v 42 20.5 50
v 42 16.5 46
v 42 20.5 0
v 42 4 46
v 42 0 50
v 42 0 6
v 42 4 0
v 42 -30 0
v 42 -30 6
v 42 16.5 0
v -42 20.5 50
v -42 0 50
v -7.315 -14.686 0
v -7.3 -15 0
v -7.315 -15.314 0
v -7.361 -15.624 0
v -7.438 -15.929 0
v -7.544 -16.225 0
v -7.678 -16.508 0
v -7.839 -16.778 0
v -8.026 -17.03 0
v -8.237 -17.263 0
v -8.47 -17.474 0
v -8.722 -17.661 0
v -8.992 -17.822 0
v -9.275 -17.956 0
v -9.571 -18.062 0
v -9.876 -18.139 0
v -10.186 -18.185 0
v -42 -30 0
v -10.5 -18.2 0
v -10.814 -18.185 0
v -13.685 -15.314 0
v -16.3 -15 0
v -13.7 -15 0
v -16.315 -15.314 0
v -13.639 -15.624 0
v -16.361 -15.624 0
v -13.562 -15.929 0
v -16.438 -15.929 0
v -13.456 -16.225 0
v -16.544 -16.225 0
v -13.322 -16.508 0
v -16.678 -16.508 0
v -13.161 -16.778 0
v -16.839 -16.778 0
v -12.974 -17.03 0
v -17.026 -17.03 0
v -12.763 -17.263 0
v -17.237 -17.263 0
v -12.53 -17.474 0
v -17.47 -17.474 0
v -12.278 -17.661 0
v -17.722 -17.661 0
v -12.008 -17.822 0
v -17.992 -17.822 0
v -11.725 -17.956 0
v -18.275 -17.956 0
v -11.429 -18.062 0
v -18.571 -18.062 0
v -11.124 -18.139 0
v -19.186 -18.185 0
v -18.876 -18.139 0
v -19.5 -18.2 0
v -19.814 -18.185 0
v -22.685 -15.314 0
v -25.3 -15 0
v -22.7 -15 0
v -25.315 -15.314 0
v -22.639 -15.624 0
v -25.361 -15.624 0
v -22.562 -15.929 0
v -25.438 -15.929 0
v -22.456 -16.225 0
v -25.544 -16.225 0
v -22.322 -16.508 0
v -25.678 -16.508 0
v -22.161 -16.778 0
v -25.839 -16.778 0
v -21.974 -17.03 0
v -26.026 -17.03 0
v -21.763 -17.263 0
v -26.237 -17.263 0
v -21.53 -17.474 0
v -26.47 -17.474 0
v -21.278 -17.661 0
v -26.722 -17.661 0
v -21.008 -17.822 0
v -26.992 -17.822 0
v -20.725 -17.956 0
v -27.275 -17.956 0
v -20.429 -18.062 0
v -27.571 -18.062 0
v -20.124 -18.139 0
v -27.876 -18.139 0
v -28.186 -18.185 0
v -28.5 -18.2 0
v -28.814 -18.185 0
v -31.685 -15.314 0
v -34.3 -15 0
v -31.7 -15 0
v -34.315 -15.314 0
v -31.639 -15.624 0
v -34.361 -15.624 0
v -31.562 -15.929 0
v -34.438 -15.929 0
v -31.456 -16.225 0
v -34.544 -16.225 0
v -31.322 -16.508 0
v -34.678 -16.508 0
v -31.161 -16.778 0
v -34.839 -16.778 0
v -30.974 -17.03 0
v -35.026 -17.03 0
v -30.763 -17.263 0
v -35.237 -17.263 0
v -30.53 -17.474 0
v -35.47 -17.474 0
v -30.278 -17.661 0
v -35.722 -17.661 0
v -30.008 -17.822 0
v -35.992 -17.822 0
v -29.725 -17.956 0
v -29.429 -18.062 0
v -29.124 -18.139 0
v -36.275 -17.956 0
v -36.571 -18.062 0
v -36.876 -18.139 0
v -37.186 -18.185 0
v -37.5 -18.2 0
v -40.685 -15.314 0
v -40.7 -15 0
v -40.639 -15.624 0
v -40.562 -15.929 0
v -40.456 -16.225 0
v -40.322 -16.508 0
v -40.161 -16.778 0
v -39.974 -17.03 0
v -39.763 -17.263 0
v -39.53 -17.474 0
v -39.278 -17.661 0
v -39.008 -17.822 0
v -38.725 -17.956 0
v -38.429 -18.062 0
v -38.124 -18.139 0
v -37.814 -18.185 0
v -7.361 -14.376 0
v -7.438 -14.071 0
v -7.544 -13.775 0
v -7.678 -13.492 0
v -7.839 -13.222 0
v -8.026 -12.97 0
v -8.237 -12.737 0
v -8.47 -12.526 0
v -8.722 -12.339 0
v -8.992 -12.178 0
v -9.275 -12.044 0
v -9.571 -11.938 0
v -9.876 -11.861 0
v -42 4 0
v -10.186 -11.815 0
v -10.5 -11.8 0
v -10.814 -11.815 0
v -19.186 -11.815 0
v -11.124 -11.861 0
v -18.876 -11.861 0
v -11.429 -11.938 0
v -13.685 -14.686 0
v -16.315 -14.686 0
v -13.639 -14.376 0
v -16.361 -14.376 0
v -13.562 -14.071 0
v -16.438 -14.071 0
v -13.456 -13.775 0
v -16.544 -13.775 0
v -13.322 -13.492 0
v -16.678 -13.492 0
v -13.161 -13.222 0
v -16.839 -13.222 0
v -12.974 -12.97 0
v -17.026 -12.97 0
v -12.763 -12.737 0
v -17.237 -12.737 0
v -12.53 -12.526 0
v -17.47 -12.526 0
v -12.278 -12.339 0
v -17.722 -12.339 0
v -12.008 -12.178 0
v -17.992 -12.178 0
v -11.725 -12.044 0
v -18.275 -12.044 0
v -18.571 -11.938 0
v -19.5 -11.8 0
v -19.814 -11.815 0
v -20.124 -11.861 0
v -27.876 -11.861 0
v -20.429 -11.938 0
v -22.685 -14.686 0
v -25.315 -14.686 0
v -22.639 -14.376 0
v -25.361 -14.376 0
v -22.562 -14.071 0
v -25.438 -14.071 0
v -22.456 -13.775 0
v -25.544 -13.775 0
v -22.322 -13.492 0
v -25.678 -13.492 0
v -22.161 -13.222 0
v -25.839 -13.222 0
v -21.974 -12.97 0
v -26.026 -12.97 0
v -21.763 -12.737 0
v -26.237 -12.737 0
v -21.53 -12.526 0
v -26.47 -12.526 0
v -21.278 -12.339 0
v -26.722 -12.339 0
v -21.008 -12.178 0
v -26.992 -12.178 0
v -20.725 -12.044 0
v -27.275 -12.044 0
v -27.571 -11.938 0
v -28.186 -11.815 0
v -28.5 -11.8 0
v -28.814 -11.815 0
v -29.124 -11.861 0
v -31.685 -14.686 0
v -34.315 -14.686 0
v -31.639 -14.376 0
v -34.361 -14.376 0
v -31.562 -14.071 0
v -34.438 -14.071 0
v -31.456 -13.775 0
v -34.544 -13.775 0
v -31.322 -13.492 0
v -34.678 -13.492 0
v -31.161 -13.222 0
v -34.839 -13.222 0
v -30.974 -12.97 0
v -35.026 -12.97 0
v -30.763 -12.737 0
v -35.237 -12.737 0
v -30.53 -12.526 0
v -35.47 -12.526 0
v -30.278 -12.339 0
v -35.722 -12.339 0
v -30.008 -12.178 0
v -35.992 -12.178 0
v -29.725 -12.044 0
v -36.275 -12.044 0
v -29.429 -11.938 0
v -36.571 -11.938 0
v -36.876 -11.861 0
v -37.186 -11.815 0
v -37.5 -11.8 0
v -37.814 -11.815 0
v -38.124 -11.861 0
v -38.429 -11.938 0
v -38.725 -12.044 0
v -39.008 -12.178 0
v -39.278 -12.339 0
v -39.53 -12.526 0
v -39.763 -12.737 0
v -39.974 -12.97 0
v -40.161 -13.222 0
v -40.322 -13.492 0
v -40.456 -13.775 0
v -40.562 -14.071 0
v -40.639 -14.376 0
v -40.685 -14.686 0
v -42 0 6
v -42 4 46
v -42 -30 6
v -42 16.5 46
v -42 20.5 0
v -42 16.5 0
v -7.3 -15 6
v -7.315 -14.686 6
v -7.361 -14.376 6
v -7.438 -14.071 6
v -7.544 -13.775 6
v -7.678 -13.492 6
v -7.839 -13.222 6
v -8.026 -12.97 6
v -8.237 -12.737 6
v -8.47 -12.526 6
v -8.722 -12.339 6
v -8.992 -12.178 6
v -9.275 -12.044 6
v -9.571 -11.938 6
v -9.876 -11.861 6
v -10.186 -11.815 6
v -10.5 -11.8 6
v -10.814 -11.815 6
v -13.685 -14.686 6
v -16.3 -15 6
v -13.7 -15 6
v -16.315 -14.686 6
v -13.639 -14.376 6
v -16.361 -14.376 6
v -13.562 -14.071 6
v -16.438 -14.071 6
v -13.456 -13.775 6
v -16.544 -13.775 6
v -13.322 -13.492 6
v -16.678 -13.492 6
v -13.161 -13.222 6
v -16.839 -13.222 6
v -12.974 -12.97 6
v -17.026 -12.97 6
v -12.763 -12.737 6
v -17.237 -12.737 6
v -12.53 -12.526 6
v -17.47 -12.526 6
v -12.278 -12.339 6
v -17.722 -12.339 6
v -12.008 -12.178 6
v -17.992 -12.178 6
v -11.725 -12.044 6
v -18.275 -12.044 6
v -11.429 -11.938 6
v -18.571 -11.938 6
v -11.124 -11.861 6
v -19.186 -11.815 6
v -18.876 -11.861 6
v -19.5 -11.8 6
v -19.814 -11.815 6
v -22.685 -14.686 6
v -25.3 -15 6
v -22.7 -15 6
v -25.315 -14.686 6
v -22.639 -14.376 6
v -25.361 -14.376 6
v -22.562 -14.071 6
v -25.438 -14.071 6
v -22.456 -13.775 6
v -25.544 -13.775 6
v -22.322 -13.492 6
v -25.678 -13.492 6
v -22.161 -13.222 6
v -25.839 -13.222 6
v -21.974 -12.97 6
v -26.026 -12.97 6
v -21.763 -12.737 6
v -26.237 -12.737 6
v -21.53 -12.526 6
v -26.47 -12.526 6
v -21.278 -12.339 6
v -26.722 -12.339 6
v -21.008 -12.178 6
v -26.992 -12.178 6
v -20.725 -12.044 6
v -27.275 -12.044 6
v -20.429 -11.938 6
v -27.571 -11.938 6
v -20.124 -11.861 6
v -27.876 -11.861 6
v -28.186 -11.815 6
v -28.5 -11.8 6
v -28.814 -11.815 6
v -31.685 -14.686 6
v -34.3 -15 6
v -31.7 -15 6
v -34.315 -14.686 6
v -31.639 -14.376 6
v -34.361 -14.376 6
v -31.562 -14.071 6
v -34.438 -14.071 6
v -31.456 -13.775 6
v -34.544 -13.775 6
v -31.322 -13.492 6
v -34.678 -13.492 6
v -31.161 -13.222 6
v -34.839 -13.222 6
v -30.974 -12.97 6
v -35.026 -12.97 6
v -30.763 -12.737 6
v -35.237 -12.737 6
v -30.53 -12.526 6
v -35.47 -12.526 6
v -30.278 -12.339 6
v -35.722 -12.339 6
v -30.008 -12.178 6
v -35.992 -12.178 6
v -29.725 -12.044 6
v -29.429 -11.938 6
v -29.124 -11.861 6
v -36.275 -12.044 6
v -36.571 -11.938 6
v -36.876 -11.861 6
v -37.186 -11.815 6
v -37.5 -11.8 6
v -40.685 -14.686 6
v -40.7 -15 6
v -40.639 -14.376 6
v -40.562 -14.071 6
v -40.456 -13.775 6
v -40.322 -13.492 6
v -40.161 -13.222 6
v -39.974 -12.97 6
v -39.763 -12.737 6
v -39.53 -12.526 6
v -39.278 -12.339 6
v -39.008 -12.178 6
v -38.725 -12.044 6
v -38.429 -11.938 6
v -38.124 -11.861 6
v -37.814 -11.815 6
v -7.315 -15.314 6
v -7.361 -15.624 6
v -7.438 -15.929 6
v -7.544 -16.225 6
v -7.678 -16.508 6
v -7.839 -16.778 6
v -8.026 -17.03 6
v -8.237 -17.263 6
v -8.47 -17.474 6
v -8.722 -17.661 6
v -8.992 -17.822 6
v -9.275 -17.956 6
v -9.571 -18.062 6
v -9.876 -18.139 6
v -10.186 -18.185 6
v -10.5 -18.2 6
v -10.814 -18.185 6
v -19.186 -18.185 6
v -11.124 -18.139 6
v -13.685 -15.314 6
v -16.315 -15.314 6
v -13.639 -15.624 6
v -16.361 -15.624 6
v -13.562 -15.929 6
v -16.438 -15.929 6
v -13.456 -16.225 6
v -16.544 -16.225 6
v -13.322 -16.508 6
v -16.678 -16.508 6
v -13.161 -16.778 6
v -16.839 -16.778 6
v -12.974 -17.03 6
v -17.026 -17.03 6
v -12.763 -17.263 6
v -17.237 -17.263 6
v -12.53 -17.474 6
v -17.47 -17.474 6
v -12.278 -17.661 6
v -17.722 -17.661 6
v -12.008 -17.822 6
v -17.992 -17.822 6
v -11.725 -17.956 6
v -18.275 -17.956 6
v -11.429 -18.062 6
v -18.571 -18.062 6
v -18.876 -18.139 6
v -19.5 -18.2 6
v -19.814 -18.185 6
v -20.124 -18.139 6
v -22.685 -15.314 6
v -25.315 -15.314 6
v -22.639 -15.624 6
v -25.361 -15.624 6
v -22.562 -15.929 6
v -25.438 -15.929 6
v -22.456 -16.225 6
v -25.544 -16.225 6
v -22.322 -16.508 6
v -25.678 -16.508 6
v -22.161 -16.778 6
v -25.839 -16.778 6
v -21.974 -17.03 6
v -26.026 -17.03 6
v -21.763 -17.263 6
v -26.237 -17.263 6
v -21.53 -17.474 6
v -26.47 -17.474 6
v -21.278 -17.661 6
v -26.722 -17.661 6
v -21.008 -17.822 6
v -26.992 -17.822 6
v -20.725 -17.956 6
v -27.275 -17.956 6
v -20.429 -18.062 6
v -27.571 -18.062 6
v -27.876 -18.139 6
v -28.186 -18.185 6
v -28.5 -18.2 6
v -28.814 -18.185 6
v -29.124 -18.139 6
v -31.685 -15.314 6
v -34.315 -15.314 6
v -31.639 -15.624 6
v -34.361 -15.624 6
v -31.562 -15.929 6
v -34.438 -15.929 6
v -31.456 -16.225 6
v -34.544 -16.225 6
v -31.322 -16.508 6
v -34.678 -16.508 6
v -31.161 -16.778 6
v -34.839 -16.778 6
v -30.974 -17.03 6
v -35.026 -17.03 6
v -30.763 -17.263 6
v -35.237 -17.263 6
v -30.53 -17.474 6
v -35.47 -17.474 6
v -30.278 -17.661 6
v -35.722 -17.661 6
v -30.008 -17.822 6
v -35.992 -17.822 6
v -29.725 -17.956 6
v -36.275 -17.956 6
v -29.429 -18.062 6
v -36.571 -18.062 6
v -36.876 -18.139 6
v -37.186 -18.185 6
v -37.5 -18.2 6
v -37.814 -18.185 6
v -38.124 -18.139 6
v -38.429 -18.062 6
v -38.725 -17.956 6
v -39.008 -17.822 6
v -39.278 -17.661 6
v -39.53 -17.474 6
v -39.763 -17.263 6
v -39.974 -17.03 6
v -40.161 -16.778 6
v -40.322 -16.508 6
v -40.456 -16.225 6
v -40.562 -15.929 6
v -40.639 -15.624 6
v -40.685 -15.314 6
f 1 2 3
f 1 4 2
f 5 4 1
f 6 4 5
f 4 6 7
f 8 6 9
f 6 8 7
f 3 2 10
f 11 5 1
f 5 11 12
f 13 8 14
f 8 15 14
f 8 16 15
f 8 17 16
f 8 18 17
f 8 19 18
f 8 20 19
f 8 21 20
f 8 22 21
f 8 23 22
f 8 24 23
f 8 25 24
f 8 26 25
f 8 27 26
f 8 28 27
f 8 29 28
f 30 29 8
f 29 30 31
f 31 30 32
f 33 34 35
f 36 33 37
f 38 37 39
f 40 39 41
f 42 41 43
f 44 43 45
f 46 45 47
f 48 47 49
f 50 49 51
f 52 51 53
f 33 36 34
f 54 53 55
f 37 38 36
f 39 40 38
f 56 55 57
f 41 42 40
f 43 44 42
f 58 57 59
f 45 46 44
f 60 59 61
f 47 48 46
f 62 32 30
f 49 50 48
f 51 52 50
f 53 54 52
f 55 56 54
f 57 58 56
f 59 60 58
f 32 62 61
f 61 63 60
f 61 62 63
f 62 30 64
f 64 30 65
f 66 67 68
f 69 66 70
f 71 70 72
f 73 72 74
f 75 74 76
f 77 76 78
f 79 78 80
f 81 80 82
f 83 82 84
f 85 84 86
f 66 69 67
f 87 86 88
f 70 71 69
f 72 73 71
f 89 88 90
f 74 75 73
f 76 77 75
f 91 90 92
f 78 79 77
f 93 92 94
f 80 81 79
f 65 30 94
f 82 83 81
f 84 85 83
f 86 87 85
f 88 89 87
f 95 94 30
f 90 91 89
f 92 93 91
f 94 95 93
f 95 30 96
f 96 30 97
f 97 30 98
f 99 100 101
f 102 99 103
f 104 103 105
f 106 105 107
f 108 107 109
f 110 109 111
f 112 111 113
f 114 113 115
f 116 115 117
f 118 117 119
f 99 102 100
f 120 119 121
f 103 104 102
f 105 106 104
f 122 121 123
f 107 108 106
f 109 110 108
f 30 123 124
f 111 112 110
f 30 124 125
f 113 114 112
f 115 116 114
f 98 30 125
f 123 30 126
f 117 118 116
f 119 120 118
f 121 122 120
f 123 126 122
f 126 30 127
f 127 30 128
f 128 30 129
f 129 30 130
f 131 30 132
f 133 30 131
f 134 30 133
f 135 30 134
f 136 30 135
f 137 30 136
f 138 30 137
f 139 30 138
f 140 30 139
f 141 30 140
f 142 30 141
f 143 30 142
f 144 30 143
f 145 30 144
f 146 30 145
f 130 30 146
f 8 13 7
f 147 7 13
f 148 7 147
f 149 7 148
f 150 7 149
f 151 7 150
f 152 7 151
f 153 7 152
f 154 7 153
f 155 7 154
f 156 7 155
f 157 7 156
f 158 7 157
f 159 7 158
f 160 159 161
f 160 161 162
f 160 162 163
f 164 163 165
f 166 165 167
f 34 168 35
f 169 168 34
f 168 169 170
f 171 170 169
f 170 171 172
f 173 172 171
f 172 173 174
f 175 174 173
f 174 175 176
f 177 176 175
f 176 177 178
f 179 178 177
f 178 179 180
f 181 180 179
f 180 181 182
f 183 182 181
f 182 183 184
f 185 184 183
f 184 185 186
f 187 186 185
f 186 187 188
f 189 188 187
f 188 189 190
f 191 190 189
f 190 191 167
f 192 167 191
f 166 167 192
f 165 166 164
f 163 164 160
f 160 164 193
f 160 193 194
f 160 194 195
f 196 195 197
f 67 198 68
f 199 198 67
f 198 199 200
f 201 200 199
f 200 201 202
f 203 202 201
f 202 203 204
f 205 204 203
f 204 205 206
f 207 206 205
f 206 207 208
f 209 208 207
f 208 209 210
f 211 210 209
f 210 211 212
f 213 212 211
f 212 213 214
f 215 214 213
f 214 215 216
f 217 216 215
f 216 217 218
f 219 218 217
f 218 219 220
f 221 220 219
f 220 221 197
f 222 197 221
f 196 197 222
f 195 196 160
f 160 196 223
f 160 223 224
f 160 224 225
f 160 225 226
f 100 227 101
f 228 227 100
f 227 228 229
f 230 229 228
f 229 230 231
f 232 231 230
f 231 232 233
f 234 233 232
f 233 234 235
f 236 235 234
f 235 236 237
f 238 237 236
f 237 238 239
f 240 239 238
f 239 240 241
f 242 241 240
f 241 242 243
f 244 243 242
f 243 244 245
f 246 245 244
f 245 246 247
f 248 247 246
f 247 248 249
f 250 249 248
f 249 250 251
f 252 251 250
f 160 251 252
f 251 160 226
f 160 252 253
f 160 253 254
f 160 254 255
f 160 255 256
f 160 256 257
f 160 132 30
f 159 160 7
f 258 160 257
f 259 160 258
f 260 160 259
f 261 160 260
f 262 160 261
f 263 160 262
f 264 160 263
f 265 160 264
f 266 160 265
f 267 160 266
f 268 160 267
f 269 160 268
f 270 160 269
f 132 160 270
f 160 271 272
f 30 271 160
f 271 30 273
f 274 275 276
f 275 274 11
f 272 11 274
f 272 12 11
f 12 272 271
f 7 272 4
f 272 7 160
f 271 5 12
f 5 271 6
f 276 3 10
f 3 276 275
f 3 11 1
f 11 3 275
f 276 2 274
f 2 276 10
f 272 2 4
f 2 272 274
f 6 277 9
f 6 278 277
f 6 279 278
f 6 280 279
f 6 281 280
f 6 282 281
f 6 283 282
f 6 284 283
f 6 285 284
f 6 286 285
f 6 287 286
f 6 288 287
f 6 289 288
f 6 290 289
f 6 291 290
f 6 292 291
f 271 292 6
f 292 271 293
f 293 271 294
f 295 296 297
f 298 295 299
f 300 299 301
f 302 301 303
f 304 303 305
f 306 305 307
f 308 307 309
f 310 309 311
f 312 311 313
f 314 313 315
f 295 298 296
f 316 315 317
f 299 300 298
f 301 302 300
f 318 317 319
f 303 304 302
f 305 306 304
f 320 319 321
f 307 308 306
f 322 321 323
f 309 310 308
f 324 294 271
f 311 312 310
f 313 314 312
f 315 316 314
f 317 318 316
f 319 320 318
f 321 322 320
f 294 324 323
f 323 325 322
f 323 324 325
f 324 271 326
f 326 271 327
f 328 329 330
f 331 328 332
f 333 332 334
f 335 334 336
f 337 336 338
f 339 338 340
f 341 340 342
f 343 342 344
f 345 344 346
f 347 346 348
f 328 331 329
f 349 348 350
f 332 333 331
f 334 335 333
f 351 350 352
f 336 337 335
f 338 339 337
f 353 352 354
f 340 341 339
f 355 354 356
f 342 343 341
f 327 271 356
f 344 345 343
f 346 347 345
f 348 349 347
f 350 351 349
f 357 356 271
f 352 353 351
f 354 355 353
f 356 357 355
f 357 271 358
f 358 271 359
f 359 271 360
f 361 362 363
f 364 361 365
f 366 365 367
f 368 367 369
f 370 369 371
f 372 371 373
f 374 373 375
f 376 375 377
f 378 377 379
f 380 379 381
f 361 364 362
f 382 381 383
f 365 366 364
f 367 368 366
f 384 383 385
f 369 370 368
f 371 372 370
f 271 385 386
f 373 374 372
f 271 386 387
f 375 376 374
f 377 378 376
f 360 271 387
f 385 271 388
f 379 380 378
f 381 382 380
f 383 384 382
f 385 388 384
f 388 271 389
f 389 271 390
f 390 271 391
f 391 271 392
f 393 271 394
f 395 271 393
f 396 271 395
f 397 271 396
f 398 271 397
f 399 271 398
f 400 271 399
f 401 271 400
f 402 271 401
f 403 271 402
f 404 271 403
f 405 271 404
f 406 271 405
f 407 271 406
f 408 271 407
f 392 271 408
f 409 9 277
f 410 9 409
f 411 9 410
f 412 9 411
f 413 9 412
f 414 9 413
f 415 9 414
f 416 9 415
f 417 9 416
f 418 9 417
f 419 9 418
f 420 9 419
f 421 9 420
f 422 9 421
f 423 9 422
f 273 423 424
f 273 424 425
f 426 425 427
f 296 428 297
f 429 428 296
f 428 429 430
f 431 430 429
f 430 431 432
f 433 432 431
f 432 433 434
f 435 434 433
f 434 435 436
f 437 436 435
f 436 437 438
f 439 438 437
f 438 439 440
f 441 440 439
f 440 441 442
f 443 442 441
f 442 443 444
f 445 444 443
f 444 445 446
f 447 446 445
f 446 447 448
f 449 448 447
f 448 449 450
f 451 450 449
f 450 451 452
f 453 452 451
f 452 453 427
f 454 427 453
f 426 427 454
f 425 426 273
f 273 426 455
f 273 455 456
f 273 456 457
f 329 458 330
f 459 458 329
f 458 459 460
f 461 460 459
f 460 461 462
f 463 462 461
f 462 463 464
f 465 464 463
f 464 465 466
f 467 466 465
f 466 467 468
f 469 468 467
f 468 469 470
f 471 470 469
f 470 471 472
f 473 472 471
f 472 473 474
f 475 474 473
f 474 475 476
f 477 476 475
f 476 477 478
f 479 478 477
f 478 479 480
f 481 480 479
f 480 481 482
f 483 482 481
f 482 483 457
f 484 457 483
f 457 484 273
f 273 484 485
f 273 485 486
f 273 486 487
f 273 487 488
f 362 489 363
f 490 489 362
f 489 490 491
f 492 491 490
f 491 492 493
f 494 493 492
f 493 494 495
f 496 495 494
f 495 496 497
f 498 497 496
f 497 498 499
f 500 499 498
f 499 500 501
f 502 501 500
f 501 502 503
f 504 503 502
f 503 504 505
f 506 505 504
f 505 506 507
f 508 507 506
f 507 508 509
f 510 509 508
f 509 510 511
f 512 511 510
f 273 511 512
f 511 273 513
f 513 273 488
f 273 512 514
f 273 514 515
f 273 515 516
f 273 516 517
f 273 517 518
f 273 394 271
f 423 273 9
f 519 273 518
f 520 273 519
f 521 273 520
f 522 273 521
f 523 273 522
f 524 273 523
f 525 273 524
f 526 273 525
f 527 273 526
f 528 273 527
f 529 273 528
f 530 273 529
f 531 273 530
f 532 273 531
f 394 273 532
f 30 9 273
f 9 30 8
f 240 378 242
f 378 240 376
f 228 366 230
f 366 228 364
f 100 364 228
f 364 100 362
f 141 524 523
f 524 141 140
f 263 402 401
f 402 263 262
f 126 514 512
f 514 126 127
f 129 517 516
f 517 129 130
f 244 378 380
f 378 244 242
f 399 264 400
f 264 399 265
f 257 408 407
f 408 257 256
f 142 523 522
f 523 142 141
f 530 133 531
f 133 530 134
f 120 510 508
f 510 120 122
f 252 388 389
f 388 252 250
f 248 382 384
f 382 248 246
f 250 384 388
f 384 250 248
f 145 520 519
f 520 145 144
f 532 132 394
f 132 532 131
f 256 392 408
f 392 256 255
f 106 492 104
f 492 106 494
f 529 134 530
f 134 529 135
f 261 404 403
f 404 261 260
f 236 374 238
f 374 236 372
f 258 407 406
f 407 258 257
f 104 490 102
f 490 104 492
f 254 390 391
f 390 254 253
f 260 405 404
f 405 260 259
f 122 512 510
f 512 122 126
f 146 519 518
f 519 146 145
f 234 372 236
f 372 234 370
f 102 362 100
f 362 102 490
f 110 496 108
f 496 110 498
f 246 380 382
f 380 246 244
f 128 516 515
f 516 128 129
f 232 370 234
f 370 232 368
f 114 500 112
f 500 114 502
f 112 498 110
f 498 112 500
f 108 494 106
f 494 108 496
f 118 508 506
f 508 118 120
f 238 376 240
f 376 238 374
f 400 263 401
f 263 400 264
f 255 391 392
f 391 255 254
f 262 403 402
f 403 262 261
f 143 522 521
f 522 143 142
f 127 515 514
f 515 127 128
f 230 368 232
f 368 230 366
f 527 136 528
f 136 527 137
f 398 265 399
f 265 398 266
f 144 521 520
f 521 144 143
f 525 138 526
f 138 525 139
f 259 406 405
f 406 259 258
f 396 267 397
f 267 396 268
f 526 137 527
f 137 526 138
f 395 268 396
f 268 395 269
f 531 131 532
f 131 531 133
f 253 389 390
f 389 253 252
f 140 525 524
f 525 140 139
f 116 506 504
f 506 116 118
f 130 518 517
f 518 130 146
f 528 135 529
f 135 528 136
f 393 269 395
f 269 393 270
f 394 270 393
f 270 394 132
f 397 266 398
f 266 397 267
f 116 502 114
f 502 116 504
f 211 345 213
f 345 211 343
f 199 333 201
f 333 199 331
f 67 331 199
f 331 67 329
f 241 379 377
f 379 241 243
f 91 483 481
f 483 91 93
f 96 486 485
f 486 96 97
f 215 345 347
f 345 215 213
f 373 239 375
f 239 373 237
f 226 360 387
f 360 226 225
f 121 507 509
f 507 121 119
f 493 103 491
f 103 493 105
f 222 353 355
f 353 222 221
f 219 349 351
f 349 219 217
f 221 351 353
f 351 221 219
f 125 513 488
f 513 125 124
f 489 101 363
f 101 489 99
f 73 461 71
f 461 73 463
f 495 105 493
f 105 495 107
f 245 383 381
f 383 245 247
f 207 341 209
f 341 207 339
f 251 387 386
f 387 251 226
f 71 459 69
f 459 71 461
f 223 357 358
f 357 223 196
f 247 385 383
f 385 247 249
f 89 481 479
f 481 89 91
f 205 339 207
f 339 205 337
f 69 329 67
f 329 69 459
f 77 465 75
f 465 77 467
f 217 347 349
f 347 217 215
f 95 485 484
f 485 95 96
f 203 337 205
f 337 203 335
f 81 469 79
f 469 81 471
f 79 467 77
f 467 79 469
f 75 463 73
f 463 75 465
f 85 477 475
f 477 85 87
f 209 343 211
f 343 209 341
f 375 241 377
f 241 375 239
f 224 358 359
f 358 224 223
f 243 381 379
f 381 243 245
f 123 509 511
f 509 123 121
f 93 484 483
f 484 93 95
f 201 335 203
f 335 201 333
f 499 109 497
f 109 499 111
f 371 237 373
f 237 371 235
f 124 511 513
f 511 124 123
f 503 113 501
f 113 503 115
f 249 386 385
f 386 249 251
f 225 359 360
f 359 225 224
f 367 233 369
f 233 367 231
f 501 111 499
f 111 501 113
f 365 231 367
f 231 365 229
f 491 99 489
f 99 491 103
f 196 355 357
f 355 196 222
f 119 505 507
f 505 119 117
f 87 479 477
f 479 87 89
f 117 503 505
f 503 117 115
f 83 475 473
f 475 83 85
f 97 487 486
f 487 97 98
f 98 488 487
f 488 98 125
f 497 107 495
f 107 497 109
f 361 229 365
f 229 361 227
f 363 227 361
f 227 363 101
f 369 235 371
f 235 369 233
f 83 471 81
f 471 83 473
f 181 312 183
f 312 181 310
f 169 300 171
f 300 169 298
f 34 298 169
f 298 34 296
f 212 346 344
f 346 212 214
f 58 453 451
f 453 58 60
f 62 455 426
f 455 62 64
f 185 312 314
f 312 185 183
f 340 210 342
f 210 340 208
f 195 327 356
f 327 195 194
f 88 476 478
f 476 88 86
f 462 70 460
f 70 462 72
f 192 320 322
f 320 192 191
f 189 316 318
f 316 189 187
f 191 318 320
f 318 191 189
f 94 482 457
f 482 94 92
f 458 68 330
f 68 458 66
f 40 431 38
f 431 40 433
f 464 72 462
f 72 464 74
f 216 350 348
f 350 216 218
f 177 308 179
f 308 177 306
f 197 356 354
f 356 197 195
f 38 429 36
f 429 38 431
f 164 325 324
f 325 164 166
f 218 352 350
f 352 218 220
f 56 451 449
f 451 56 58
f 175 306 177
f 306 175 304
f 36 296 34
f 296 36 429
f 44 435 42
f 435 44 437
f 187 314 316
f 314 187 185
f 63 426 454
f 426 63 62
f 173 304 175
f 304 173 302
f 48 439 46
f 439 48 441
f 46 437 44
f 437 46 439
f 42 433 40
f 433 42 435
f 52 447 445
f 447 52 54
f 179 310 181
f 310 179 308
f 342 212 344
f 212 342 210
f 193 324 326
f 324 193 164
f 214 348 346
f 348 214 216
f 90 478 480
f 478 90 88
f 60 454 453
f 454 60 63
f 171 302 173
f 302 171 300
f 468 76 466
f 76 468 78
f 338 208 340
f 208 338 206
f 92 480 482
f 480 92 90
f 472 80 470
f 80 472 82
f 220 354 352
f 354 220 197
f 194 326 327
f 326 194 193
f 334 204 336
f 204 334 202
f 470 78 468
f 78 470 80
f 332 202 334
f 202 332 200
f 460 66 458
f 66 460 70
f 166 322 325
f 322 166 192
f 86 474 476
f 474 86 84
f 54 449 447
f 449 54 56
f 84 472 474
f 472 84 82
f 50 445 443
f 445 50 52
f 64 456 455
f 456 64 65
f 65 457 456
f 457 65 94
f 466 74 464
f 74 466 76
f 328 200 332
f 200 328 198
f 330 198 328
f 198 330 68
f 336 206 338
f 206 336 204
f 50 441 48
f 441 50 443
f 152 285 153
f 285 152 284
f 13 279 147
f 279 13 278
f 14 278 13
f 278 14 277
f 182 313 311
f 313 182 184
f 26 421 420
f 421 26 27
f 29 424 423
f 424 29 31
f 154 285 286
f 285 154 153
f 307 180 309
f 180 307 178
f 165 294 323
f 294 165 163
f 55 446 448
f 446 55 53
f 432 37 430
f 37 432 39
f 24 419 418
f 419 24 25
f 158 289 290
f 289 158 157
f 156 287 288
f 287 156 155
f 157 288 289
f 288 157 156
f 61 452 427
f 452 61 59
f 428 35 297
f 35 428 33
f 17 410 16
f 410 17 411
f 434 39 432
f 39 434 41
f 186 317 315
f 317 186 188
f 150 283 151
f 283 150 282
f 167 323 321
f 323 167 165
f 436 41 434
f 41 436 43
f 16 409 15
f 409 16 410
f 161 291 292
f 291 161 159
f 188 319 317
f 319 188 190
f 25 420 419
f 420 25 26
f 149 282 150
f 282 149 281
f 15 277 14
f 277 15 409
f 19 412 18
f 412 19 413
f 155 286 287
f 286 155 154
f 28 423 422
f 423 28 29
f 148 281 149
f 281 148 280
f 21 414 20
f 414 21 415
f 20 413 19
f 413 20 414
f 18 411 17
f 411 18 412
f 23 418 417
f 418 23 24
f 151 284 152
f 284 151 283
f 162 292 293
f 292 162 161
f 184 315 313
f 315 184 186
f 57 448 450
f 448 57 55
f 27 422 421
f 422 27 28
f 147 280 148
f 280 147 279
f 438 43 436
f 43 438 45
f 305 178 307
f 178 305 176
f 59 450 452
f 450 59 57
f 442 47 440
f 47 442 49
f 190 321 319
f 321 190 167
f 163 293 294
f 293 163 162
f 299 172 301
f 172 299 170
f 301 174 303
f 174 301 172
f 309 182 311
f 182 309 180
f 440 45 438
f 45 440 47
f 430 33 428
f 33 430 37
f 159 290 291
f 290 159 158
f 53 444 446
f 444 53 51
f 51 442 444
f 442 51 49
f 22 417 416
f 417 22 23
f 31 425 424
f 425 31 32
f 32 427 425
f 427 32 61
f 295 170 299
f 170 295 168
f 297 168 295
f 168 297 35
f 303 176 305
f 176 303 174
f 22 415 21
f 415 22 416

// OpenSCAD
// --- Dimensions ---
length_x = 84;             // Overall extrusion length along X
gap_width = 12.5;          // Gap for the 12mm wall
leg_thickness = 4;         // Thickness of the legs
leg_height = 50;           // Height of the legs
bridge_height_start = 46;  // Start of the top bridge
bridge_height_end = 50;    // End of the top bridge
ledge_thickness = 6;       // Thickness of the ledge (z=0 to 6)
ledge_depth = 30;          // Ledge extends from y=0 to y=-30
hole_diameter = 6.4;       // Diameter of PCR tube holes
hole_y_pos = -15;          // Y-coordinate of the holes
hole_spacing_x = 9;        // Spacing between holes along X
num_holes = 8;             // Number of holes

// --- Parameters ---
$fn = 64;

// --- Calculations ---
// Calculate X offset to center the 8 holes along the 84mm length
// Total span of holes = (num_holes - 1) * spacing
hole_span = (num_holes - 1) * hole_spacing_x;
x_start = -(hole_span / 2);

// --- Modeling ---

// The user wants the part centered on X=0.
// The profile is in the YZ plane and extruded along X.
// We build the 3D geometry directly in the X-Y-Z coordinate system.

module part_geometry() {
    difference() {
        union() {
            // 1. Inner Leg: y = 0 to 4, z = 0 to 50
            cube([length_x, leg_thickness, leg_height]);
            
            // 2. Outer Leg: y = 16.5 to 20.5, z = 0 to 50
            // Note: The user specified y=16.5 to 20.5. 
            // This implies a gap of 16.5 - 4 = 12.5mm.
            translate([0, 16.5, 0])
                cube([length_x, 4, leg_height]);
            
            // 3. Top Bridge: z = 46 to 50, spanning the gap
            // Spans from y=0 to y=20.5
            translate([0, 0, bridge_height_start])
                cube([length_x, 20.5, bridge_height_end - bridge_height_start]);
            
            // 4. Ledge: y = -30 to 0, z = 0 to 6
            // Note: User said "reaches toward -Y from y=0 to y=-30"
            translate([0, -ledge_depth, 0])
                cube([length_x, ledge_depth, ledge_thickness]);
        }

        // 5. Vertical Holes: 6.4mm through-holes in the ledge
        // "Vertical" means along the Z axis.
        // "Through-holes" in the 6mm ledge means they cut from z=0 to z=6.
        // To ensure a clean cut, we extend the cylinder slightly in Z.
        for (i = [0 : num_holes - 1]) {
            translate([x_start + (i * hole_spacing_x), hole_y_pos, -1])
                cylinder(d = hole_diameter, h = ledge_thickness + 2);
        }
    }
}

// Final Assembly:
// The part is centered on X=0.
// The geometry is built from X=0 to X=84, so we translate by -length_x/2.
translate([-length_x/2, 0, 0])
    part_geometry();
